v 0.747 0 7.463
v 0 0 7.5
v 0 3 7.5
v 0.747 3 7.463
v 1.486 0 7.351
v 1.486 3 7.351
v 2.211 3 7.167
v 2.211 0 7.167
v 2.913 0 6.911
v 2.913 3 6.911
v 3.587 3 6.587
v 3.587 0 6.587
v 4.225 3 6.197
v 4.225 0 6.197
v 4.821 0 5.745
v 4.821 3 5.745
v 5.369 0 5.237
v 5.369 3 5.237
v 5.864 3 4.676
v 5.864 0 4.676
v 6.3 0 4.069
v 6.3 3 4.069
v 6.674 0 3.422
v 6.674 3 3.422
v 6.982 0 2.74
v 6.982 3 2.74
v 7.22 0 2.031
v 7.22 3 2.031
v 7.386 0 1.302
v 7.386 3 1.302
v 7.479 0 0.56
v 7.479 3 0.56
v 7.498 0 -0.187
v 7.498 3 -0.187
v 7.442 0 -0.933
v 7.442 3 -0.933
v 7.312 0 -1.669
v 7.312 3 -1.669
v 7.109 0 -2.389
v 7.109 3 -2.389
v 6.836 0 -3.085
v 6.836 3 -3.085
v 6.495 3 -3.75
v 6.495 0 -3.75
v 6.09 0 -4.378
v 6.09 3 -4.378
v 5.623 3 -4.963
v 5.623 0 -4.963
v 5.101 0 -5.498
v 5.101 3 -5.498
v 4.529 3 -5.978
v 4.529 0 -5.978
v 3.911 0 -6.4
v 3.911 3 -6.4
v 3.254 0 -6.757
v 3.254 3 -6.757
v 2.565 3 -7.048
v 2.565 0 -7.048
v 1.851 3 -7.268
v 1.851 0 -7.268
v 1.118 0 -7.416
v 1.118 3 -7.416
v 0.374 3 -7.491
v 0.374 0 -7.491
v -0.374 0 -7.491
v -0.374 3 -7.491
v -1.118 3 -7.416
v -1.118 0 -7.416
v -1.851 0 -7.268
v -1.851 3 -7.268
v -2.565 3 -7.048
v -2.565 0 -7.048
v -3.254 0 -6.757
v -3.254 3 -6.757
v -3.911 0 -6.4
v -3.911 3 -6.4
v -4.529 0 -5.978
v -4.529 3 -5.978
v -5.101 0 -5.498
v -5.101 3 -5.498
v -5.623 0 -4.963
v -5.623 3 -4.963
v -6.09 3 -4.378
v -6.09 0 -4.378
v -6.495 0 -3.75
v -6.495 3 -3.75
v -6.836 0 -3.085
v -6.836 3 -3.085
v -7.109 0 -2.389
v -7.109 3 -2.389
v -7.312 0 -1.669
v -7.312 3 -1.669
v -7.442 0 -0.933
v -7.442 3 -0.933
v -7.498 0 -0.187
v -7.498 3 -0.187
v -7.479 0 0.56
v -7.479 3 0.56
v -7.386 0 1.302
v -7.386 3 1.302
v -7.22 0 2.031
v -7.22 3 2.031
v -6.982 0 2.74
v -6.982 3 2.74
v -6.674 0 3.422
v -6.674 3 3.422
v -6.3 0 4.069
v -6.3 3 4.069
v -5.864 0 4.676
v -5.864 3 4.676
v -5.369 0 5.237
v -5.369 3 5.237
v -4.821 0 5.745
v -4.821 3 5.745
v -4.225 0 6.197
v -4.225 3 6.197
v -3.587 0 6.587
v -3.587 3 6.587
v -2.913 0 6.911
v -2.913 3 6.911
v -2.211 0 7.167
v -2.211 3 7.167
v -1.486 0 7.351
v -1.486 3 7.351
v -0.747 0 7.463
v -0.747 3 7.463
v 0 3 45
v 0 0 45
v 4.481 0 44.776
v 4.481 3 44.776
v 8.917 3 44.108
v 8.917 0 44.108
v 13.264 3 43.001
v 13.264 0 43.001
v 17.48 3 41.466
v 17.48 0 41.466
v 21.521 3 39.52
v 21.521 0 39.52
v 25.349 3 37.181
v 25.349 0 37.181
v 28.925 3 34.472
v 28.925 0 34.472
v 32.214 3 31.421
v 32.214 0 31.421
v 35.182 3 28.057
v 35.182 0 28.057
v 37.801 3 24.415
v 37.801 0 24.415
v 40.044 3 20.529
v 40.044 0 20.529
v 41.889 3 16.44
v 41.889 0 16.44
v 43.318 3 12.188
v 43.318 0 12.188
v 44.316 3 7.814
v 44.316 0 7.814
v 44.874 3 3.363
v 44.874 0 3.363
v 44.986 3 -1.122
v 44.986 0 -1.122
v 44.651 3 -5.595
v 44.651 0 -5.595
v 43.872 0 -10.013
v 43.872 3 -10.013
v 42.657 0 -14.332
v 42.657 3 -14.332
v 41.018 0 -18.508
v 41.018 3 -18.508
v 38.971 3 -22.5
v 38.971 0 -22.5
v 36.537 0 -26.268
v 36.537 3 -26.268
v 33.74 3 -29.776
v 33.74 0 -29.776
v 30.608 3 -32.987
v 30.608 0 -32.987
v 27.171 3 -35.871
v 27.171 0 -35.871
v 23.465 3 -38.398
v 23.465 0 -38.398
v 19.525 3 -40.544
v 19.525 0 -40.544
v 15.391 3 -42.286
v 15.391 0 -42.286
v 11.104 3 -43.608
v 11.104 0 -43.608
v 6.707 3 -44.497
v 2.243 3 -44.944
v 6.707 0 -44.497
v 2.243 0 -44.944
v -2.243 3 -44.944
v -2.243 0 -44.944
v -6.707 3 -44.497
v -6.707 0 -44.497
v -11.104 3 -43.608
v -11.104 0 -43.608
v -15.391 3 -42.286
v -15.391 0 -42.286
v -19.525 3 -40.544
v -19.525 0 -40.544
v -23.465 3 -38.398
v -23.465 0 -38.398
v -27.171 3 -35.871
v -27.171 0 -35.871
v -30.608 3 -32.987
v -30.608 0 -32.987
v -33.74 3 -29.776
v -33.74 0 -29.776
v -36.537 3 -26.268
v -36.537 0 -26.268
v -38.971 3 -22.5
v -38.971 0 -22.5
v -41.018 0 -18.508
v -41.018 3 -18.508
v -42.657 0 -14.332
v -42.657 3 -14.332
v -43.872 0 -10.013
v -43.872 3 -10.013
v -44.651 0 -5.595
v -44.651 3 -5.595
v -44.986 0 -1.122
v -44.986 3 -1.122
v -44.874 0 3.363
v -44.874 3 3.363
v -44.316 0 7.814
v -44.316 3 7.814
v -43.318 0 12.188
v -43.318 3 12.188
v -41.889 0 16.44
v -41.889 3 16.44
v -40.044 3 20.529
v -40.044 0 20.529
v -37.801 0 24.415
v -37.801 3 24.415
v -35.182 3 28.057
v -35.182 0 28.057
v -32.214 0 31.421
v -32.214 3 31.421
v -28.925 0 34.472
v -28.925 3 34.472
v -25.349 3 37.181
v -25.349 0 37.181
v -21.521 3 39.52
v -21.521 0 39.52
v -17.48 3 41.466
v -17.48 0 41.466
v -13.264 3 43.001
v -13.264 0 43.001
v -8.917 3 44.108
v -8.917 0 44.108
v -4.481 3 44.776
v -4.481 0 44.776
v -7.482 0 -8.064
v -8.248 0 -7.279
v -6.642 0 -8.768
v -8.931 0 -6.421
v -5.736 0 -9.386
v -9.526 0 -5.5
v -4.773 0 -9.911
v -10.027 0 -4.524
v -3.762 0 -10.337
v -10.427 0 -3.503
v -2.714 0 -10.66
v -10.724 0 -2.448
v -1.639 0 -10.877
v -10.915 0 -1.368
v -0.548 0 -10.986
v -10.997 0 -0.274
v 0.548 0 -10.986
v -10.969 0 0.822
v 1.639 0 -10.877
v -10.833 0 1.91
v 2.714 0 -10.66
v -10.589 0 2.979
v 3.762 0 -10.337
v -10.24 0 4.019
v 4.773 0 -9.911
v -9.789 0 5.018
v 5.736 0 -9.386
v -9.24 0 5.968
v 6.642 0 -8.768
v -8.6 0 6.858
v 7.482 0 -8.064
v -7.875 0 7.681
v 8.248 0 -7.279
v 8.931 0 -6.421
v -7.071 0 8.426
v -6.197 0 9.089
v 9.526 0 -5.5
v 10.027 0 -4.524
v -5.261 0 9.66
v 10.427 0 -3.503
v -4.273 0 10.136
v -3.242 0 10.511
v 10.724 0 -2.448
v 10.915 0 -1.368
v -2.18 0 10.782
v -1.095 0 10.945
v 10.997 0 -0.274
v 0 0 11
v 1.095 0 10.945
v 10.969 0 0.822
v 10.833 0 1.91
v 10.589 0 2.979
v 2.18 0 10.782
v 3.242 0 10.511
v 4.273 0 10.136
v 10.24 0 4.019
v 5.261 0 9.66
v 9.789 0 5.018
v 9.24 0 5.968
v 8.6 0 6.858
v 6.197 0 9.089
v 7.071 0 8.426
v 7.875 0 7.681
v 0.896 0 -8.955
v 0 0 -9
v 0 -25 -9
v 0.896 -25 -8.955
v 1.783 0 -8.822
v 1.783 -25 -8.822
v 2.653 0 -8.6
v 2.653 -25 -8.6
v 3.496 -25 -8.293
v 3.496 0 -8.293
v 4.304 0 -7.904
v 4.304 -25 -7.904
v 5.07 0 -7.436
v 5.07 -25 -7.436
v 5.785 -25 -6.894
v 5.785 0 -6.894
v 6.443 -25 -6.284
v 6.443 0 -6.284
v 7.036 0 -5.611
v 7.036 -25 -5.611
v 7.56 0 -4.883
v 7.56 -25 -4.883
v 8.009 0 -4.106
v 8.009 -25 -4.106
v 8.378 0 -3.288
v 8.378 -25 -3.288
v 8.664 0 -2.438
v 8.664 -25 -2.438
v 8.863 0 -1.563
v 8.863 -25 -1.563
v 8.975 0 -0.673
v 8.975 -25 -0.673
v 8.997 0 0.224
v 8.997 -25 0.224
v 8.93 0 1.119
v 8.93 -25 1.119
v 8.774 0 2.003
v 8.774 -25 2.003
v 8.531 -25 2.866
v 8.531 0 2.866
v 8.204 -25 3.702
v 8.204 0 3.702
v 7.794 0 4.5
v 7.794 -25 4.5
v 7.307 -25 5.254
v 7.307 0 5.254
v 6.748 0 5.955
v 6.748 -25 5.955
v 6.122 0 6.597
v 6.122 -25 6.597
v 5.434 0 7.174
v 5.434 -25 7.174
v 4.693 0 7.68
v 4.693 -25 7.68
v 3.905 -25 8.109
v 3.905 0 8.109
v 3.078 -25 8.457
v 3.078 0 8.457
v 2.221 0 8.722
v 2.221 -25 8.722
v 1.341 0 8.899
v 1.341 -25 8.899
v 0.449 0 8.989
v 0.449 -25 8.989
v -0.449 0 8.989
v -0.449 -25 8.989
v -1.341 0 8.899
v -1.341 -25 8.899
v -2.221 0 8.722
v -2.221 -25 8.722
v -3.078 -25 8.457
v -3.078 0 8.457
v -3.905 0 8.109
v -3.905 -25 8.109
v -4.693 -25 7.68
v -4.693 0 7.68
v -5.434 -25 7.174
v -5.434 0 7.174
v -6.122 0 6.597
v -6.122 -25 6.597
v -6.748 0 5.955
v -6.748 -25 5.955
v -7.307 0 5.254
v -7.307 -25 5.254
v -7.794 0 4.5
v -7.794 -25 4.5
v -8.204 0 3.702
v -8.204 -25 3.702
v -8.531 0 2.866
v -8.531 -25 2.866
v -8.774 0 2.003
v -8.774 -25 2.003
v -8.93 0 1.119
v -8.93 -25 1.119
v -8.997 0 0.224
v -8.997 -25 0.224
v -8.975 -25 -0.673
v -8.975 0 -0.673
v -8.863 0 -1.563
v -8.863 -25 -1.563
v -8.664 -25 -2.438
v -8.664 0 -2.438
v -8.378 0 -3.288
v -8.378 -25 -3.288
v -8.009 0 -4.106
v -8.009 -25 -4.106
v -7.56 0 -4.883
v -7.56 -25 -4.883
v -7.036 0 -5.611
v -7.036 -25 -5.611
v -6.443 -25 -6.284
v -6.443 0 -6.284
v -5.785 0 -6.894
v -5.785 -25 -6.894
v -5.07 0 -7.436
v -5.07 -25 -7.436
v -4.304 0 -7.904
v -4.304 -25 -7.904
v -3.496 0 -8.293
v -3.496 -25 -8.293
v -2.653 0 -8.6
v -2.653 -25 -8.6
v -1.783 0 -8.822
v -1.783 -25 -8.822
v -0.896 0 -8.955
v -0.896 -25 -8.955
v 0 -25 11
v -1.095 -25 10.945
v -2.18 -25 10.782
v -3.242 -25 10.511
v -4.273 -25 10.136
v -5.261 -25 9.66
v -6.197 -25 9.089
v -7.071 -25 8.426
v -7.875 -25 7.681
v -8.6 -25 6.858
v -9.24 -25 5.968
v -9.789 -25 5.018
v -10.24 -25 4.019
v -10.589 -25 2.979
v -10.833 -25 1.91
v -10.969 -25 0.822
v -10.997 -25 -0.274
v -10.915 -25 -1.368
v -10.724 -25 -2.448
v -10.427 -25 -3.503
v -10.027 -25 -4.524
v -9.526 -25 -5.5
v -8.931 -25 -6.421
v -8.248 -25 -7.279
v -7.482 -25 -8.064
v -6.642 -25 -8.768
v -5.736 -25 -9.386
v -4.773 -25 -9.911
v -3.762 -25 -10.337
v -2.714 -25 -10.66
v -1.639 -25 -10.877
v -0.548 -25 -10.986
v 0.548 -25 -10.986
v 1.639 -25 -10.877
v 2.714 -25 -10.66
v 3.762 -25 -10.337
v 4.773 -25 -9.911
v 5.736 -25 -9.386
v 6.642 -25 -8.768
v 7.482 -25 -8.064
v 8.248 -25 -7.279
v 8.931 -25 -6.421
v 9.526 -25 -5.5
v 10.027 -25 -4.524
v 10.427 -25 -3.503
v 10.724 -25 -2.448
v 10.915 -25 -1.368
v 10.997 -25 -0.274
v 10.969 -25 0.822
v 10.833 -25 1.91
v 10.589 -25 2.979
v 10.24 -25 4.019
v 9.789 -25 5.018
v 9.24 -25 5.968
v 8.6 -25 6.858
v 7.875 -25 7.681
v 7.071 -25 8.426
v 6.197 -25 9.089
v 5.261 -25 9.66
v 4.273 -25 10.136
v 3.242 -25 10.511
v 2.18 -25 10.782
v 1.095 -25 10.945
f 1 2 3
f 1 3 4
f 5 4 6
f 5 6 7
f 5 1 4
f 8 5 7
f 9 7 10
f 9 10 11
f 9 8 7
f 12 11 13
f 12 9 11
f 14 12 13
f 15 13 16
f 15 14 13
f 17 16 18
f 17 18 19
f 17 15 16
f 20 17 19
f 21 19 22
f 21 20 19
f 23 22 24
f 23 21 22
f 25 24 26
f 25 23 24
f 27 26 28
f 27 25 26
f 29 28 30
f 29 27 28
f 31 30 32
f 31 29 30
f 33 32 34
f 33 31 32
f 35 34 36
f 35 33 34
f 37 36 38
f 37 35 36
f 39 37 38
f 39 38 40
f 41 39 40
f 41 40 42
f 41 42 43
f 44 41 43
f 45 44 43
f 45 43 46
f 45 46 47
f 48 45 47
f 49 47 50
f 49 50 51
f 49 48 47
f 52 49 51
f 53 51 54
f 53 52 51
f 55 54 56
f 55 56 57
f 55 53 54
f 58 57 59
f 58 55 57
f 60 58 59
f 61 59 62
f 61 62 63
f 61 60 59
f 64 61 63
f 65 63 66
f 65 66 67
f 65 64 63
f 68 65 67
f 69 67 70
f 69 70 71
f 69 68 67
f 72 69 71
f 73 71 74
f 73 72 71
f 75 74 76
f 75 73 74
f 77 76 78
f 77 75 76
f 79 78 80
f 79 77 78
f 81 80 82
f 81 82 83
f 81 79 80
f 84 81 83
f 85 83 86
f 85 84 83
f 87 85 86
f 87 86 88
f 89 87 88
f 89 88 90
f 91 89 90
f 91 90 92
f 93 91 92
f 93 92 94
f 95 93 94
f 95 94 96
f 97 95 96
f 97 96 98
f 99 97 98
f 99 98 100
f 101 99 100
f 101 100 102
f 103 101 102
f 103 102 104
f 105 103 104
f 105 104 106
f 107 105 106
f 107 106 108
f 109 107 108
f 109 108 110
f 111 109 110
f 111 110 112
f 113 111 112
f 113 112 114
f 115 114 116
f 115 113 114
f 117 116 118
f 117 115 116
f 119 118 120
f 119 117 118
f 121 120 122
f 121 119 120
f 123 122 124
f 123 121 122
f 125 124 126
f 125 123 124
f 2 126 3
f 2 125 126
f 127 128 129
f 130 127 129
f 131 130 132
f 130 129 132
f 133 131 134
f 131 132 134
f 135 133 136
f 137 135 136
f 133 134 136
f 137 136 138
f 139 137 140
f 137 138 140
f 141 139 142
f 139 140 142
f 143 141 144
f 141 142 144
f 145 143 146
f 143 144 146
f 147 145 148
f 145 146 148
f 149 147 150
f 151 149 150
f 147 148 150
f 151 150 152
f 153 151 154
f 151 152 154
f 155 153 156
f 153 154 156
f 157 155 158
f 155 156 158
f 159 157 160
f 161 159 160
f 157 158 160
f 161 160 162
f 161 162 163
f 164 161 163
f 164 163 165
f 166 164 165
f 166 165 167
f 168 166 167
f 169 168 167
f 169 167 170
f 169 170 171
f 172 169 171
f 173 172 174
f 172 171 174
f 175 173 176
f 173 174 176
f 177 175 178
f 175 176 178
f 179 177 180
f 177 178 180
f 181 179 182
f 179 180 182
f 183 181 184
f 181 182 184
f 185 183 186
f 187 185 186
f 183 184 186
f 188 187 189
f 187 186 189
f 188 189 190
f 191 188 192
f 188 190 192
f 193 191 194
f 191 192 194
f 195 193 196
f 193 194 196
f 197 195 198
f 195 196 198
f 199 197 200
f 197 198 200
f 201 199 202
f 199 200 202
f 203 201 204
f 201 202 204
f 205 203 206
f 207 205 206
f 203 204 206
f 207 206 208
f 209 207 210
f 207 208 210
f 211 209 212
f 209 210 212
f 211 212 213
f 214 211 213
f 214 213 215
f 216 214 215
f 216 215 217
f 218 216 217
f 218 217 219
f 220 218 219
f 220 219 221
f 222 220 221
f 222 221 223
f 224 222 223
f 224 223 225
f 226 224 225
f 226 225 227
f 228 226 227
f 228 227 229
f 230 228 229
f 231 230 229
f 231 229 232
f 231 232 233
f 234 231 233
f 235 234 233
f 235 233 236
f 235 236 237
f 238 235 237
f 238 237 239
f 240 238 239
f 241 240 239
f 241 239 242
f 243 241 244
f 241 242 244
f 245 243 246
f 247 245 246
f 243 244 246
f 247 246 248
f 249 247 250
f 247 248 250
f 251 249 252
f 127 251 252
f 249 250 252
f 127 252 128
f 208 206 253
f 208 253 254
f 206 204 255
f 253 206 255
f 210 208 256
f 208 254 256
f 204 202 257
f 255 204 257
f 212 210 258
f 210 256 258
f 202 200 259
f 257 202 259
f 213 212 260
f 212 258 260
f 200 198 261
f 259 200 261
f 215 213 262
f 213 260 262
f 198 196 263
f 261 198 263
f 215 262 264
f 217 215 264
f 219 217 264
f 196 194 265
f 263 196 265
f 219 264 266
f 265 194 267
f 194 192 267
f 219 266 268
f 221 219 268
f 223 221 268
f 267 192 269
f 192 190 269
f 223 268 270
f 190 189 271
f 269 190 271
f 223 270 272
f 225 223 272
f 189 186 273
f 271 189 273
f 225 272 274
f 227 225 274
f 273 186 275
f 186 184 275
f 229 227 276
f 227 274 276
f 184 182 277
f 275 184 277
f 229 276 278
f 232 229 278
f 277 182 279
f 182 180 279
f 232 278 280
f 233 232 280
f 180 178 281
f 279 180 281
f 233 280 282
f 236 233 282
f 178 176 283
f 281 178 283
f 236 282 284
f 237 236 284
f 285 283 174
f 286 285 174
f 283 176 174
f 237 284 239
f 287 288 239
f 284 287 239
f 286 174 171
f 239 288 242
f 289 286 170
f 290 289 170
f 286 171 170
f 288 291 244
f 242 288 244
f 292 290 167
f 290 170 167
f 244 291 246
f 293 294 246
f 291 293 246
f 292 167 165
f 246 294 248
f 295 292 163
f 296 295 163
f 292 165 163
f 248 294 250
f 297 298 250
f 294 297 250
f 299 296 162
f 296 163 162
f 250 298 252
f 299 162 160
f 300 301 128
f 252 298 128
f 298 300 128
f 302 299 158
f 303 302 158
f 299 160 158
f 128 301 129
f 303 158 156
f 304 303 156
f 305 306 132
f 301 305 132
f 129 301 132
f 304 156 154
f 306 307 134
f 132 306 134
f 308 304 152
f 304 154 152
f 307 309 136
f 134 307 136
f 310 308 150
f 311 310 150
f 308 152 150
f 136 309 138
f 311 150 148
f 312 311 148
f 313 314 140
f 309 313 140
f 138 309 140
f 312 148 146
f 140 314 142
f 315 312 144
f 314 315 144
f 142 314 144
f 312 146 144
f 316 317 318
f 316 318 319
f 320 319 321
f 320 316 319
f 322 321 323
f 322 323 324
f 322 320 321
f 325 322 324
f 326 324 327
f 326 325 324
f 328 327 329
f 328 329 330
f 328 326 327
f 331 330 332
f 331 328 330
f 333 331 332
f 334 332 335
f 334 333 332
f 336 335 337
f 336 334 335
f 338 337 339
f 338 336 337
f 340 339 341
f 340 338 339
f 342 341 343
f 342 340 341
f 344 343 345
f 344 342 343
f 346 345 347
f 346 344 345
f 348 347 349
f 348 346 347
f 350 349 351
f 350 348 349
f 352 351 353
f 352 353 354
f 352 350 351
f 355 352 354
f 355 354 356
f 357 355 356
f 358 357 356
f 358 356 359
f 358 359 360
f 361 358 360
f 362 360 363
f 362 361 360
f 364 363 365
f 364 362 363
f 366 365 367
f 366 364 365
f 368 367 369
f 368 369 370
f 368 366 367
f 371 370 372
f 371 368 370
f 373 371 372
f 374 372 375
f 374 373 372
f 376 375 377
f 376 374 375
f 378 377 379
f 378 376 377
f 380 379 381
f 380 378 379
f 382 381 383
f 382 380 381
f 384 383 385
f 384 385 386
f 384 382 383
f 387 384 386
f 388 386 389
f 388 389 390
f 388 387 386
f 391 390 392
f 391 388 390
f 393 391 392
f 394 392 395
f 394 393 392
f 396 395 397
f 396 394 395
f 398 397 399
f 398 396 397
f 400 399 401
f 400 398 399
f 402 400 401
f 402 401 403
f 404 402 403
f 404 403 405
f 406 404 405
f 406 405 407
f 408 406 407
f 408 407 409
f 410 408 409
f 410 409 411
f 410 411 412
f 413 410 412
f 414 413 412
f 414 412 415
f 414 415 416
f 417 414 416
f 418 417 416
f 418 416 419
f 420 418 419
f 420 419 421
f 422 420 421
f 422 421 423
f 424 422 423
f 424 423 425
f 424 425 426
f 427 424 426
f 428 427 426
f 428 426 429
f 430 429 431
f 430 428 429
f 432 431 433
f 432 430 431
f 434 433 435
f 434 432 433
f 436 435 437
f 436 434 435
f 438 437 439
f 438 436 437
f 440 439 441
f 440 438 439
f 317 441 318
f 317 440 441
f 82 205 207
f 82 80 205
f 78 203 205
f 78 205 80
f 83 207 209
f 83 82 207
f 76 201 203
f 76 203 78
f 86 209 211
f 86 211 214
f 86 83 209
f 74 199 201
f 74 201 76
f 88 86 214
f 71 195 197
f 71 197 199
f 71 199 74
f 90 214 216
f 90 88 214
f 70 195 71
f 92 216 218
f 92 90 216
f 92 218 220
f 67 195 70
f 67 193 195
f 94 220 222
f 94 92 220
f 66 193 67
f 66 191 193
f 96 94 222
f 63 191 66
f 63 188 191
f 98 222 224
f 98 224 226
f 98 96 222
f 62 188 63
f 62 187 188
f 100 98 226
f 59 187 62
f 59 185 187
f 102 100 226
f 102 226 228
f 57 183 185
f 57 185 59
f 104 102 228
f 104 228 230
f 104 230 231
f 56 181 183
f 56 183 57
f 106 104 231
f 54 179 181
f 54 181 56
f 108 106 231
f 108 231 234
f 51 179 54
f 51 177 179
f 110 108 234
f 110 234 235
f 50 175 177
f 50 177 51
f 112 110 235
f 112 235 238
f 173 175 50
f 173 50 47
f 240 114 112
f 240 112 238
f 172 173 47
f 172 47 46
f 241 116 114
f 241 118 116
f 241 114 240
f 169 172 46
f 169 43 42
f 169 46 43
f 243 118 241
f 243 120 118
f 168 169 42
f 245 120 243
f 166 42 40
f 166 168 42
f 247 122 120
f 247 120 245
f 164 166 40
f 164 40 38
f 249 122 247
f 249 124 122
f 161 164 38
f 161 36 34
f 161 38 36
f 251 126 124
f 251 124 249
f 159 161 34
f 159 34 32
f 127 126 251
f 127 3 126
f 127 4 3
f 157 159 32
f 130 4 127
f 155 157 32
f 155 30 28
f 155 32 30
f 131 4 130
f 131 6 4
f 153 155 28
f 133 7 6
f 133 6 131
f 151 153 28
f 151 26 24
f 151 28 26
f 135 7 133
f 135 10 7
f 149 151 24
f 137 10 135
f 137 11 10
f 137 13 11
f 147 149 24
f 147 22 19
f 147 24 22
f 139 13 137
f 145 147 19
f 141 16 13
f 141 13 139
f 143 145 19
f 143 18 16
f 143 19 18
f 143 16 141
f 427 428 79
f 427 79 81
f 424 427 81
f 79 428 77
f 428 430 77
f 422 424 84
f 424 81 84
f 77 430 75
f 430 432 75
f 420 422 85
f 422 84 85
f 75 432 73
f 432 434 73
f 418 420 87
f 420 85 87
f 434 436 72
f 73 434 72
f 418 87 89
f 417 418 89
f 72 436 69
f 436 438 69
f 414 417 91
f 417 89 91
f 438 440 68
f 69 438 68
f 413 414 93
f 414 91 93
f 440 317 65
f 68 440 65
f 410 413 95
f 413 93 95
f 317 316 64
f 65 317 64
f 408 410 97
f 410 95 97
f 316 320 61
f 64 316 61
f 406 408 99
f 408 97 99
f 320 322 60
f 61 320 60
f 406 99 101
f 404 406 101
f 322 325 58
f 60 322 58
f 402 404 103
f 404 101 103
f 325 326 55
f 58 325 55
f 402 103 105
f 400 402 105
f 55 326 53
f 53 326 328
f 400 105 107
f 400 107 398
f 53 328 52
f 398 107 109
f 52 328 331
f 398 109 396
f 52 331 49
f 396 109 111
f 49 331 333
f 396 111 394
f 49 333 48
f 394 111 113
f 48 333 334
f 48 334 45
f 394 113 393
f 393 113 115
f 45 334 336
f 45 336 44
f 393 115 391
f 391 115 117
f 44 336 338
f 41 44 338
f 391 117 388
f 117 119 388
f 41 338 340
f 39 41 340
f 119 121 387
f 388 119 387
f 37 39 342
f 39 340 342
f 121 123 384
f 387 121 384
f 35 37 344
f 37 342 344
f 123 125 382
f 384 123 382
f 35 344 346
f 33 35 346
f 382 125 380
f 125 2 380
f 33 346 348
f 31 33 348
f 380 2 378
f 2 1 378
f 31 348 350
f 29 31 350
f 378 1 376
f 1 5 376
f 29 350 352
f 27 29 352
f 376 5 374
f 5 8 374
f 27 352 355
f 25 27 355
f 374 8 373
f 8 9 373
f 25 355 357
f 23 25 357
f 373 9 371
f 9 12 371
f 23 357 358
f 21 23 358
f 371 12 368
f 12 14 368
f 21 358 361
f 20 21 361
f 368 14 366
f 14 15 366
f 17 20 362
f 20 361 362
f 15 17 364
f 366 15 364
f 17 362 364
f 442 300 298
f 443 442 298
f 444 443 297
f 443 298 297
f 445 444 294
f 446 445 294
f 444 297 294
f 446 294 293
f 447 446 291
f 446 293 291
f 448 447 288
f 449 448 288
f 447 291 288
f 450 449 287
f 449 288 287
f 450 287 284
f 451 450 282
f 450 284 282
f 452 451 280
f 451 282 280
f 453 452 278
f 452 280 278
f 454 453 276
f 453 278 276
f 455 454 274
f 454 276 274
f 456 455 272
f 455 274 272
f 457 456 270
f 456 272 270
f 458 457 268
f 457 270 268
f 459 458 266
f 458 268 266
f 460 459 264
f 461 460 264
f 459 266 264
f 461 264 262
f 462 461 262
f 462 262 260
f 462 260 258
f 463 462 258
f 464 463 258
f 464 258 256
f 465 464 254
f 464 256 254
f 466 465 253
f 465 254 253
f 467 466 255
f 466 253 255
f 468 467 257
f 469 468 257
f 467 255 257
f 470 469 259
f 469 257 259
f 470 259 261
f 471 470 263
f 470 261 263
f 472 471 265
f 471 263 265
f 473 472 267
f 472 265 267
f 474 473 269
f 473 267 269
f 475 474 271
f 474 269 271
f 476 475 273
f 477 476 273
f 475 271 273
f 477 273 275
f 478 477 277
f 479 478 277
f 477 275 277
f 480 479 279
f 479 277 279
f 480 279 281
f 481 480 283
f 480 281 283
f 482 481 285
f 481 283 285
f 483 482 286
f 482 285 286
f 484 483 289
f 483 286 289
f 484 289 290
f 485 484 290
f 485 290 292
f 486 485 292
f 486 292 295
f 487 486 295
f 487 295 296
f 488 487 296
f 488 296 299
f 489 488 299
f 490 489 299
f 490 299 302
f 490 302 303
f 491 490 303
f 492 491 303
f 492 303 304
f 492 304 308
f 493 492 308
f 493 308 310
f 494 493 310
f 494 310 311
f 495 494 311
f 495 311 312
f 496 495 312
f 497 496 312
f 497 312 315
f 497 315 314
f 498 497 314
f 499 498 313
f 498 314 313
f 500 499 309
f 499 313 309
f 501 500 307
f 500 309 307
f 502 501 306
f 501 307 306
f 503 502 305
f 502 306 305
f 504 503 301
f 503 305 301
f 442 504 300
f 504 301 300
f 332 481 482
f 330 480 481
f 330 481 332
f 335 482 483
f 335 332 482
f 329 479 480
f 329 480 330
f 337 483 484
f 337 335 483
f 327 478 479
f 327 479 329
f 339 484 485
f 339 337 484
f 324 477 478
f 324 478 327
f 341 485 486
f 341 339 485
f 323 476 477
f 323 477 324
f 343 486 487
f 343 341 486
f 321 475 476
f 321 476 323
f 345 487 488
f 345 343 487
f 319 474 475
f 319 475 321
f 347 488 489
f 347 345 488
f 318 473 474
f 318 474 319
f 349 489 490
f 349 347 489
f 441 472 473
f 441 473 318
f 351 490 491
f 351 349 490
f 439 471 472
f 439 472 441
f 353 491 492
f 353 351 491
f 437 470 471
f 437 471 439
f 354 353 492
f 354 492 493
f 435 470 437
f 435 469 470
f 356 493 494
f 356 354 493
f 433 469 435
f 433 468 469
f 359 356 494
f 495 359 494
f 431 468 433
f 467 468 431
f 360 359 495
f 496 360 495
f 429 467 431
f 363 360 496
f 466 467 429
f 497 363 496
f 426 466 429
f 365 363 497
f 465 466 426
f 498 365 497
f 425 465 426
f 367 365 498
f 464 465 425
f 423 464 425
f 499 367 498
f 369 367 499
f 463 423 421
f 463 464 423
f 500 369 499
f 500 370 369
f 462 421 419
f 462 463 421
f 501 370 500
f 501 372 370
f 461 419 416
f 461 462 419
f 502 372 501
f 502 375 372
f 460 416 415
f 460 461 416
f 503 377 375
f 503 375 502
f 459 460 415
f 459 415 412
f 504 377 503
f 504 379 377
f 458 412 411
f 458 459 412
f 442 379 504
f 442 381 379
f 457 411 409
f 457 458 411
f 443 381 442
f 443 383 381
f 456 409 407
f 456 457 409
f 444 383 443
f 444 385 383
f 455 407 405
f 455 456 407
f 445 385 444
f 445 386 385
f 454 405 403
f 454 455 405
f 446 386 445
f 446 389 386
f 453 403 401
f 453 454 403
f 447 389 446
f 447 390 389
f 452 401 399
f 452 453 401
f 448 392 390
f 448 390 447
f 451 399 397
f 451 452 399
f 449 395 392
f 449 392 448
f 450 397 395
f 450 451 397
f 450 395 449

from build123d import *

# Parameters (mm, degrees)
SKETCH1_R           = 45
SKETCH1_R_2         = 7.5
BOSS_EXTRUDE1_DEPTH = 3
SKETCH2_R           = 11
SKETCH2_R_2         = 9
BOSS_EXTRUDE2_DEPTH = 25


with BuildPart() as part:
    # Sketch1 → Boss-Extrude1 (new body)
    with BuildSketch(Plane(origin=(0, 0, 0), x_dir=(1, 0, 0), z_dir=(0, 1, 0))):
        with Locations(Location((0, 0, 0), (0, 0, 270))):
            Circle(SKETCH1_R)
        with Locations(Location((0, 0, 0), (0, 0, 270))):
            Circle(SKETCH1_R_2, mode=Mode.SUBTRACT)
    extrude(amount=BOSS_EXTRUDE1_DEPTH)

    # Sketch2 → Boss-Extrude2 (add)
    with BuildSketch(Plane.XZ):
        with Locations(Location((0, 0, 0), (0, 0, 90))):
            Circle(SKETCH2_R)
        with Locations(Location((0, 0, 0), (0, 0, 270))):
            Circle(SKETCH2_R_2, mode=Mode.SUBTRACT)
    extrude(amount=BOSS_EXTRUDE2_DEPTH)


solid = part.part
